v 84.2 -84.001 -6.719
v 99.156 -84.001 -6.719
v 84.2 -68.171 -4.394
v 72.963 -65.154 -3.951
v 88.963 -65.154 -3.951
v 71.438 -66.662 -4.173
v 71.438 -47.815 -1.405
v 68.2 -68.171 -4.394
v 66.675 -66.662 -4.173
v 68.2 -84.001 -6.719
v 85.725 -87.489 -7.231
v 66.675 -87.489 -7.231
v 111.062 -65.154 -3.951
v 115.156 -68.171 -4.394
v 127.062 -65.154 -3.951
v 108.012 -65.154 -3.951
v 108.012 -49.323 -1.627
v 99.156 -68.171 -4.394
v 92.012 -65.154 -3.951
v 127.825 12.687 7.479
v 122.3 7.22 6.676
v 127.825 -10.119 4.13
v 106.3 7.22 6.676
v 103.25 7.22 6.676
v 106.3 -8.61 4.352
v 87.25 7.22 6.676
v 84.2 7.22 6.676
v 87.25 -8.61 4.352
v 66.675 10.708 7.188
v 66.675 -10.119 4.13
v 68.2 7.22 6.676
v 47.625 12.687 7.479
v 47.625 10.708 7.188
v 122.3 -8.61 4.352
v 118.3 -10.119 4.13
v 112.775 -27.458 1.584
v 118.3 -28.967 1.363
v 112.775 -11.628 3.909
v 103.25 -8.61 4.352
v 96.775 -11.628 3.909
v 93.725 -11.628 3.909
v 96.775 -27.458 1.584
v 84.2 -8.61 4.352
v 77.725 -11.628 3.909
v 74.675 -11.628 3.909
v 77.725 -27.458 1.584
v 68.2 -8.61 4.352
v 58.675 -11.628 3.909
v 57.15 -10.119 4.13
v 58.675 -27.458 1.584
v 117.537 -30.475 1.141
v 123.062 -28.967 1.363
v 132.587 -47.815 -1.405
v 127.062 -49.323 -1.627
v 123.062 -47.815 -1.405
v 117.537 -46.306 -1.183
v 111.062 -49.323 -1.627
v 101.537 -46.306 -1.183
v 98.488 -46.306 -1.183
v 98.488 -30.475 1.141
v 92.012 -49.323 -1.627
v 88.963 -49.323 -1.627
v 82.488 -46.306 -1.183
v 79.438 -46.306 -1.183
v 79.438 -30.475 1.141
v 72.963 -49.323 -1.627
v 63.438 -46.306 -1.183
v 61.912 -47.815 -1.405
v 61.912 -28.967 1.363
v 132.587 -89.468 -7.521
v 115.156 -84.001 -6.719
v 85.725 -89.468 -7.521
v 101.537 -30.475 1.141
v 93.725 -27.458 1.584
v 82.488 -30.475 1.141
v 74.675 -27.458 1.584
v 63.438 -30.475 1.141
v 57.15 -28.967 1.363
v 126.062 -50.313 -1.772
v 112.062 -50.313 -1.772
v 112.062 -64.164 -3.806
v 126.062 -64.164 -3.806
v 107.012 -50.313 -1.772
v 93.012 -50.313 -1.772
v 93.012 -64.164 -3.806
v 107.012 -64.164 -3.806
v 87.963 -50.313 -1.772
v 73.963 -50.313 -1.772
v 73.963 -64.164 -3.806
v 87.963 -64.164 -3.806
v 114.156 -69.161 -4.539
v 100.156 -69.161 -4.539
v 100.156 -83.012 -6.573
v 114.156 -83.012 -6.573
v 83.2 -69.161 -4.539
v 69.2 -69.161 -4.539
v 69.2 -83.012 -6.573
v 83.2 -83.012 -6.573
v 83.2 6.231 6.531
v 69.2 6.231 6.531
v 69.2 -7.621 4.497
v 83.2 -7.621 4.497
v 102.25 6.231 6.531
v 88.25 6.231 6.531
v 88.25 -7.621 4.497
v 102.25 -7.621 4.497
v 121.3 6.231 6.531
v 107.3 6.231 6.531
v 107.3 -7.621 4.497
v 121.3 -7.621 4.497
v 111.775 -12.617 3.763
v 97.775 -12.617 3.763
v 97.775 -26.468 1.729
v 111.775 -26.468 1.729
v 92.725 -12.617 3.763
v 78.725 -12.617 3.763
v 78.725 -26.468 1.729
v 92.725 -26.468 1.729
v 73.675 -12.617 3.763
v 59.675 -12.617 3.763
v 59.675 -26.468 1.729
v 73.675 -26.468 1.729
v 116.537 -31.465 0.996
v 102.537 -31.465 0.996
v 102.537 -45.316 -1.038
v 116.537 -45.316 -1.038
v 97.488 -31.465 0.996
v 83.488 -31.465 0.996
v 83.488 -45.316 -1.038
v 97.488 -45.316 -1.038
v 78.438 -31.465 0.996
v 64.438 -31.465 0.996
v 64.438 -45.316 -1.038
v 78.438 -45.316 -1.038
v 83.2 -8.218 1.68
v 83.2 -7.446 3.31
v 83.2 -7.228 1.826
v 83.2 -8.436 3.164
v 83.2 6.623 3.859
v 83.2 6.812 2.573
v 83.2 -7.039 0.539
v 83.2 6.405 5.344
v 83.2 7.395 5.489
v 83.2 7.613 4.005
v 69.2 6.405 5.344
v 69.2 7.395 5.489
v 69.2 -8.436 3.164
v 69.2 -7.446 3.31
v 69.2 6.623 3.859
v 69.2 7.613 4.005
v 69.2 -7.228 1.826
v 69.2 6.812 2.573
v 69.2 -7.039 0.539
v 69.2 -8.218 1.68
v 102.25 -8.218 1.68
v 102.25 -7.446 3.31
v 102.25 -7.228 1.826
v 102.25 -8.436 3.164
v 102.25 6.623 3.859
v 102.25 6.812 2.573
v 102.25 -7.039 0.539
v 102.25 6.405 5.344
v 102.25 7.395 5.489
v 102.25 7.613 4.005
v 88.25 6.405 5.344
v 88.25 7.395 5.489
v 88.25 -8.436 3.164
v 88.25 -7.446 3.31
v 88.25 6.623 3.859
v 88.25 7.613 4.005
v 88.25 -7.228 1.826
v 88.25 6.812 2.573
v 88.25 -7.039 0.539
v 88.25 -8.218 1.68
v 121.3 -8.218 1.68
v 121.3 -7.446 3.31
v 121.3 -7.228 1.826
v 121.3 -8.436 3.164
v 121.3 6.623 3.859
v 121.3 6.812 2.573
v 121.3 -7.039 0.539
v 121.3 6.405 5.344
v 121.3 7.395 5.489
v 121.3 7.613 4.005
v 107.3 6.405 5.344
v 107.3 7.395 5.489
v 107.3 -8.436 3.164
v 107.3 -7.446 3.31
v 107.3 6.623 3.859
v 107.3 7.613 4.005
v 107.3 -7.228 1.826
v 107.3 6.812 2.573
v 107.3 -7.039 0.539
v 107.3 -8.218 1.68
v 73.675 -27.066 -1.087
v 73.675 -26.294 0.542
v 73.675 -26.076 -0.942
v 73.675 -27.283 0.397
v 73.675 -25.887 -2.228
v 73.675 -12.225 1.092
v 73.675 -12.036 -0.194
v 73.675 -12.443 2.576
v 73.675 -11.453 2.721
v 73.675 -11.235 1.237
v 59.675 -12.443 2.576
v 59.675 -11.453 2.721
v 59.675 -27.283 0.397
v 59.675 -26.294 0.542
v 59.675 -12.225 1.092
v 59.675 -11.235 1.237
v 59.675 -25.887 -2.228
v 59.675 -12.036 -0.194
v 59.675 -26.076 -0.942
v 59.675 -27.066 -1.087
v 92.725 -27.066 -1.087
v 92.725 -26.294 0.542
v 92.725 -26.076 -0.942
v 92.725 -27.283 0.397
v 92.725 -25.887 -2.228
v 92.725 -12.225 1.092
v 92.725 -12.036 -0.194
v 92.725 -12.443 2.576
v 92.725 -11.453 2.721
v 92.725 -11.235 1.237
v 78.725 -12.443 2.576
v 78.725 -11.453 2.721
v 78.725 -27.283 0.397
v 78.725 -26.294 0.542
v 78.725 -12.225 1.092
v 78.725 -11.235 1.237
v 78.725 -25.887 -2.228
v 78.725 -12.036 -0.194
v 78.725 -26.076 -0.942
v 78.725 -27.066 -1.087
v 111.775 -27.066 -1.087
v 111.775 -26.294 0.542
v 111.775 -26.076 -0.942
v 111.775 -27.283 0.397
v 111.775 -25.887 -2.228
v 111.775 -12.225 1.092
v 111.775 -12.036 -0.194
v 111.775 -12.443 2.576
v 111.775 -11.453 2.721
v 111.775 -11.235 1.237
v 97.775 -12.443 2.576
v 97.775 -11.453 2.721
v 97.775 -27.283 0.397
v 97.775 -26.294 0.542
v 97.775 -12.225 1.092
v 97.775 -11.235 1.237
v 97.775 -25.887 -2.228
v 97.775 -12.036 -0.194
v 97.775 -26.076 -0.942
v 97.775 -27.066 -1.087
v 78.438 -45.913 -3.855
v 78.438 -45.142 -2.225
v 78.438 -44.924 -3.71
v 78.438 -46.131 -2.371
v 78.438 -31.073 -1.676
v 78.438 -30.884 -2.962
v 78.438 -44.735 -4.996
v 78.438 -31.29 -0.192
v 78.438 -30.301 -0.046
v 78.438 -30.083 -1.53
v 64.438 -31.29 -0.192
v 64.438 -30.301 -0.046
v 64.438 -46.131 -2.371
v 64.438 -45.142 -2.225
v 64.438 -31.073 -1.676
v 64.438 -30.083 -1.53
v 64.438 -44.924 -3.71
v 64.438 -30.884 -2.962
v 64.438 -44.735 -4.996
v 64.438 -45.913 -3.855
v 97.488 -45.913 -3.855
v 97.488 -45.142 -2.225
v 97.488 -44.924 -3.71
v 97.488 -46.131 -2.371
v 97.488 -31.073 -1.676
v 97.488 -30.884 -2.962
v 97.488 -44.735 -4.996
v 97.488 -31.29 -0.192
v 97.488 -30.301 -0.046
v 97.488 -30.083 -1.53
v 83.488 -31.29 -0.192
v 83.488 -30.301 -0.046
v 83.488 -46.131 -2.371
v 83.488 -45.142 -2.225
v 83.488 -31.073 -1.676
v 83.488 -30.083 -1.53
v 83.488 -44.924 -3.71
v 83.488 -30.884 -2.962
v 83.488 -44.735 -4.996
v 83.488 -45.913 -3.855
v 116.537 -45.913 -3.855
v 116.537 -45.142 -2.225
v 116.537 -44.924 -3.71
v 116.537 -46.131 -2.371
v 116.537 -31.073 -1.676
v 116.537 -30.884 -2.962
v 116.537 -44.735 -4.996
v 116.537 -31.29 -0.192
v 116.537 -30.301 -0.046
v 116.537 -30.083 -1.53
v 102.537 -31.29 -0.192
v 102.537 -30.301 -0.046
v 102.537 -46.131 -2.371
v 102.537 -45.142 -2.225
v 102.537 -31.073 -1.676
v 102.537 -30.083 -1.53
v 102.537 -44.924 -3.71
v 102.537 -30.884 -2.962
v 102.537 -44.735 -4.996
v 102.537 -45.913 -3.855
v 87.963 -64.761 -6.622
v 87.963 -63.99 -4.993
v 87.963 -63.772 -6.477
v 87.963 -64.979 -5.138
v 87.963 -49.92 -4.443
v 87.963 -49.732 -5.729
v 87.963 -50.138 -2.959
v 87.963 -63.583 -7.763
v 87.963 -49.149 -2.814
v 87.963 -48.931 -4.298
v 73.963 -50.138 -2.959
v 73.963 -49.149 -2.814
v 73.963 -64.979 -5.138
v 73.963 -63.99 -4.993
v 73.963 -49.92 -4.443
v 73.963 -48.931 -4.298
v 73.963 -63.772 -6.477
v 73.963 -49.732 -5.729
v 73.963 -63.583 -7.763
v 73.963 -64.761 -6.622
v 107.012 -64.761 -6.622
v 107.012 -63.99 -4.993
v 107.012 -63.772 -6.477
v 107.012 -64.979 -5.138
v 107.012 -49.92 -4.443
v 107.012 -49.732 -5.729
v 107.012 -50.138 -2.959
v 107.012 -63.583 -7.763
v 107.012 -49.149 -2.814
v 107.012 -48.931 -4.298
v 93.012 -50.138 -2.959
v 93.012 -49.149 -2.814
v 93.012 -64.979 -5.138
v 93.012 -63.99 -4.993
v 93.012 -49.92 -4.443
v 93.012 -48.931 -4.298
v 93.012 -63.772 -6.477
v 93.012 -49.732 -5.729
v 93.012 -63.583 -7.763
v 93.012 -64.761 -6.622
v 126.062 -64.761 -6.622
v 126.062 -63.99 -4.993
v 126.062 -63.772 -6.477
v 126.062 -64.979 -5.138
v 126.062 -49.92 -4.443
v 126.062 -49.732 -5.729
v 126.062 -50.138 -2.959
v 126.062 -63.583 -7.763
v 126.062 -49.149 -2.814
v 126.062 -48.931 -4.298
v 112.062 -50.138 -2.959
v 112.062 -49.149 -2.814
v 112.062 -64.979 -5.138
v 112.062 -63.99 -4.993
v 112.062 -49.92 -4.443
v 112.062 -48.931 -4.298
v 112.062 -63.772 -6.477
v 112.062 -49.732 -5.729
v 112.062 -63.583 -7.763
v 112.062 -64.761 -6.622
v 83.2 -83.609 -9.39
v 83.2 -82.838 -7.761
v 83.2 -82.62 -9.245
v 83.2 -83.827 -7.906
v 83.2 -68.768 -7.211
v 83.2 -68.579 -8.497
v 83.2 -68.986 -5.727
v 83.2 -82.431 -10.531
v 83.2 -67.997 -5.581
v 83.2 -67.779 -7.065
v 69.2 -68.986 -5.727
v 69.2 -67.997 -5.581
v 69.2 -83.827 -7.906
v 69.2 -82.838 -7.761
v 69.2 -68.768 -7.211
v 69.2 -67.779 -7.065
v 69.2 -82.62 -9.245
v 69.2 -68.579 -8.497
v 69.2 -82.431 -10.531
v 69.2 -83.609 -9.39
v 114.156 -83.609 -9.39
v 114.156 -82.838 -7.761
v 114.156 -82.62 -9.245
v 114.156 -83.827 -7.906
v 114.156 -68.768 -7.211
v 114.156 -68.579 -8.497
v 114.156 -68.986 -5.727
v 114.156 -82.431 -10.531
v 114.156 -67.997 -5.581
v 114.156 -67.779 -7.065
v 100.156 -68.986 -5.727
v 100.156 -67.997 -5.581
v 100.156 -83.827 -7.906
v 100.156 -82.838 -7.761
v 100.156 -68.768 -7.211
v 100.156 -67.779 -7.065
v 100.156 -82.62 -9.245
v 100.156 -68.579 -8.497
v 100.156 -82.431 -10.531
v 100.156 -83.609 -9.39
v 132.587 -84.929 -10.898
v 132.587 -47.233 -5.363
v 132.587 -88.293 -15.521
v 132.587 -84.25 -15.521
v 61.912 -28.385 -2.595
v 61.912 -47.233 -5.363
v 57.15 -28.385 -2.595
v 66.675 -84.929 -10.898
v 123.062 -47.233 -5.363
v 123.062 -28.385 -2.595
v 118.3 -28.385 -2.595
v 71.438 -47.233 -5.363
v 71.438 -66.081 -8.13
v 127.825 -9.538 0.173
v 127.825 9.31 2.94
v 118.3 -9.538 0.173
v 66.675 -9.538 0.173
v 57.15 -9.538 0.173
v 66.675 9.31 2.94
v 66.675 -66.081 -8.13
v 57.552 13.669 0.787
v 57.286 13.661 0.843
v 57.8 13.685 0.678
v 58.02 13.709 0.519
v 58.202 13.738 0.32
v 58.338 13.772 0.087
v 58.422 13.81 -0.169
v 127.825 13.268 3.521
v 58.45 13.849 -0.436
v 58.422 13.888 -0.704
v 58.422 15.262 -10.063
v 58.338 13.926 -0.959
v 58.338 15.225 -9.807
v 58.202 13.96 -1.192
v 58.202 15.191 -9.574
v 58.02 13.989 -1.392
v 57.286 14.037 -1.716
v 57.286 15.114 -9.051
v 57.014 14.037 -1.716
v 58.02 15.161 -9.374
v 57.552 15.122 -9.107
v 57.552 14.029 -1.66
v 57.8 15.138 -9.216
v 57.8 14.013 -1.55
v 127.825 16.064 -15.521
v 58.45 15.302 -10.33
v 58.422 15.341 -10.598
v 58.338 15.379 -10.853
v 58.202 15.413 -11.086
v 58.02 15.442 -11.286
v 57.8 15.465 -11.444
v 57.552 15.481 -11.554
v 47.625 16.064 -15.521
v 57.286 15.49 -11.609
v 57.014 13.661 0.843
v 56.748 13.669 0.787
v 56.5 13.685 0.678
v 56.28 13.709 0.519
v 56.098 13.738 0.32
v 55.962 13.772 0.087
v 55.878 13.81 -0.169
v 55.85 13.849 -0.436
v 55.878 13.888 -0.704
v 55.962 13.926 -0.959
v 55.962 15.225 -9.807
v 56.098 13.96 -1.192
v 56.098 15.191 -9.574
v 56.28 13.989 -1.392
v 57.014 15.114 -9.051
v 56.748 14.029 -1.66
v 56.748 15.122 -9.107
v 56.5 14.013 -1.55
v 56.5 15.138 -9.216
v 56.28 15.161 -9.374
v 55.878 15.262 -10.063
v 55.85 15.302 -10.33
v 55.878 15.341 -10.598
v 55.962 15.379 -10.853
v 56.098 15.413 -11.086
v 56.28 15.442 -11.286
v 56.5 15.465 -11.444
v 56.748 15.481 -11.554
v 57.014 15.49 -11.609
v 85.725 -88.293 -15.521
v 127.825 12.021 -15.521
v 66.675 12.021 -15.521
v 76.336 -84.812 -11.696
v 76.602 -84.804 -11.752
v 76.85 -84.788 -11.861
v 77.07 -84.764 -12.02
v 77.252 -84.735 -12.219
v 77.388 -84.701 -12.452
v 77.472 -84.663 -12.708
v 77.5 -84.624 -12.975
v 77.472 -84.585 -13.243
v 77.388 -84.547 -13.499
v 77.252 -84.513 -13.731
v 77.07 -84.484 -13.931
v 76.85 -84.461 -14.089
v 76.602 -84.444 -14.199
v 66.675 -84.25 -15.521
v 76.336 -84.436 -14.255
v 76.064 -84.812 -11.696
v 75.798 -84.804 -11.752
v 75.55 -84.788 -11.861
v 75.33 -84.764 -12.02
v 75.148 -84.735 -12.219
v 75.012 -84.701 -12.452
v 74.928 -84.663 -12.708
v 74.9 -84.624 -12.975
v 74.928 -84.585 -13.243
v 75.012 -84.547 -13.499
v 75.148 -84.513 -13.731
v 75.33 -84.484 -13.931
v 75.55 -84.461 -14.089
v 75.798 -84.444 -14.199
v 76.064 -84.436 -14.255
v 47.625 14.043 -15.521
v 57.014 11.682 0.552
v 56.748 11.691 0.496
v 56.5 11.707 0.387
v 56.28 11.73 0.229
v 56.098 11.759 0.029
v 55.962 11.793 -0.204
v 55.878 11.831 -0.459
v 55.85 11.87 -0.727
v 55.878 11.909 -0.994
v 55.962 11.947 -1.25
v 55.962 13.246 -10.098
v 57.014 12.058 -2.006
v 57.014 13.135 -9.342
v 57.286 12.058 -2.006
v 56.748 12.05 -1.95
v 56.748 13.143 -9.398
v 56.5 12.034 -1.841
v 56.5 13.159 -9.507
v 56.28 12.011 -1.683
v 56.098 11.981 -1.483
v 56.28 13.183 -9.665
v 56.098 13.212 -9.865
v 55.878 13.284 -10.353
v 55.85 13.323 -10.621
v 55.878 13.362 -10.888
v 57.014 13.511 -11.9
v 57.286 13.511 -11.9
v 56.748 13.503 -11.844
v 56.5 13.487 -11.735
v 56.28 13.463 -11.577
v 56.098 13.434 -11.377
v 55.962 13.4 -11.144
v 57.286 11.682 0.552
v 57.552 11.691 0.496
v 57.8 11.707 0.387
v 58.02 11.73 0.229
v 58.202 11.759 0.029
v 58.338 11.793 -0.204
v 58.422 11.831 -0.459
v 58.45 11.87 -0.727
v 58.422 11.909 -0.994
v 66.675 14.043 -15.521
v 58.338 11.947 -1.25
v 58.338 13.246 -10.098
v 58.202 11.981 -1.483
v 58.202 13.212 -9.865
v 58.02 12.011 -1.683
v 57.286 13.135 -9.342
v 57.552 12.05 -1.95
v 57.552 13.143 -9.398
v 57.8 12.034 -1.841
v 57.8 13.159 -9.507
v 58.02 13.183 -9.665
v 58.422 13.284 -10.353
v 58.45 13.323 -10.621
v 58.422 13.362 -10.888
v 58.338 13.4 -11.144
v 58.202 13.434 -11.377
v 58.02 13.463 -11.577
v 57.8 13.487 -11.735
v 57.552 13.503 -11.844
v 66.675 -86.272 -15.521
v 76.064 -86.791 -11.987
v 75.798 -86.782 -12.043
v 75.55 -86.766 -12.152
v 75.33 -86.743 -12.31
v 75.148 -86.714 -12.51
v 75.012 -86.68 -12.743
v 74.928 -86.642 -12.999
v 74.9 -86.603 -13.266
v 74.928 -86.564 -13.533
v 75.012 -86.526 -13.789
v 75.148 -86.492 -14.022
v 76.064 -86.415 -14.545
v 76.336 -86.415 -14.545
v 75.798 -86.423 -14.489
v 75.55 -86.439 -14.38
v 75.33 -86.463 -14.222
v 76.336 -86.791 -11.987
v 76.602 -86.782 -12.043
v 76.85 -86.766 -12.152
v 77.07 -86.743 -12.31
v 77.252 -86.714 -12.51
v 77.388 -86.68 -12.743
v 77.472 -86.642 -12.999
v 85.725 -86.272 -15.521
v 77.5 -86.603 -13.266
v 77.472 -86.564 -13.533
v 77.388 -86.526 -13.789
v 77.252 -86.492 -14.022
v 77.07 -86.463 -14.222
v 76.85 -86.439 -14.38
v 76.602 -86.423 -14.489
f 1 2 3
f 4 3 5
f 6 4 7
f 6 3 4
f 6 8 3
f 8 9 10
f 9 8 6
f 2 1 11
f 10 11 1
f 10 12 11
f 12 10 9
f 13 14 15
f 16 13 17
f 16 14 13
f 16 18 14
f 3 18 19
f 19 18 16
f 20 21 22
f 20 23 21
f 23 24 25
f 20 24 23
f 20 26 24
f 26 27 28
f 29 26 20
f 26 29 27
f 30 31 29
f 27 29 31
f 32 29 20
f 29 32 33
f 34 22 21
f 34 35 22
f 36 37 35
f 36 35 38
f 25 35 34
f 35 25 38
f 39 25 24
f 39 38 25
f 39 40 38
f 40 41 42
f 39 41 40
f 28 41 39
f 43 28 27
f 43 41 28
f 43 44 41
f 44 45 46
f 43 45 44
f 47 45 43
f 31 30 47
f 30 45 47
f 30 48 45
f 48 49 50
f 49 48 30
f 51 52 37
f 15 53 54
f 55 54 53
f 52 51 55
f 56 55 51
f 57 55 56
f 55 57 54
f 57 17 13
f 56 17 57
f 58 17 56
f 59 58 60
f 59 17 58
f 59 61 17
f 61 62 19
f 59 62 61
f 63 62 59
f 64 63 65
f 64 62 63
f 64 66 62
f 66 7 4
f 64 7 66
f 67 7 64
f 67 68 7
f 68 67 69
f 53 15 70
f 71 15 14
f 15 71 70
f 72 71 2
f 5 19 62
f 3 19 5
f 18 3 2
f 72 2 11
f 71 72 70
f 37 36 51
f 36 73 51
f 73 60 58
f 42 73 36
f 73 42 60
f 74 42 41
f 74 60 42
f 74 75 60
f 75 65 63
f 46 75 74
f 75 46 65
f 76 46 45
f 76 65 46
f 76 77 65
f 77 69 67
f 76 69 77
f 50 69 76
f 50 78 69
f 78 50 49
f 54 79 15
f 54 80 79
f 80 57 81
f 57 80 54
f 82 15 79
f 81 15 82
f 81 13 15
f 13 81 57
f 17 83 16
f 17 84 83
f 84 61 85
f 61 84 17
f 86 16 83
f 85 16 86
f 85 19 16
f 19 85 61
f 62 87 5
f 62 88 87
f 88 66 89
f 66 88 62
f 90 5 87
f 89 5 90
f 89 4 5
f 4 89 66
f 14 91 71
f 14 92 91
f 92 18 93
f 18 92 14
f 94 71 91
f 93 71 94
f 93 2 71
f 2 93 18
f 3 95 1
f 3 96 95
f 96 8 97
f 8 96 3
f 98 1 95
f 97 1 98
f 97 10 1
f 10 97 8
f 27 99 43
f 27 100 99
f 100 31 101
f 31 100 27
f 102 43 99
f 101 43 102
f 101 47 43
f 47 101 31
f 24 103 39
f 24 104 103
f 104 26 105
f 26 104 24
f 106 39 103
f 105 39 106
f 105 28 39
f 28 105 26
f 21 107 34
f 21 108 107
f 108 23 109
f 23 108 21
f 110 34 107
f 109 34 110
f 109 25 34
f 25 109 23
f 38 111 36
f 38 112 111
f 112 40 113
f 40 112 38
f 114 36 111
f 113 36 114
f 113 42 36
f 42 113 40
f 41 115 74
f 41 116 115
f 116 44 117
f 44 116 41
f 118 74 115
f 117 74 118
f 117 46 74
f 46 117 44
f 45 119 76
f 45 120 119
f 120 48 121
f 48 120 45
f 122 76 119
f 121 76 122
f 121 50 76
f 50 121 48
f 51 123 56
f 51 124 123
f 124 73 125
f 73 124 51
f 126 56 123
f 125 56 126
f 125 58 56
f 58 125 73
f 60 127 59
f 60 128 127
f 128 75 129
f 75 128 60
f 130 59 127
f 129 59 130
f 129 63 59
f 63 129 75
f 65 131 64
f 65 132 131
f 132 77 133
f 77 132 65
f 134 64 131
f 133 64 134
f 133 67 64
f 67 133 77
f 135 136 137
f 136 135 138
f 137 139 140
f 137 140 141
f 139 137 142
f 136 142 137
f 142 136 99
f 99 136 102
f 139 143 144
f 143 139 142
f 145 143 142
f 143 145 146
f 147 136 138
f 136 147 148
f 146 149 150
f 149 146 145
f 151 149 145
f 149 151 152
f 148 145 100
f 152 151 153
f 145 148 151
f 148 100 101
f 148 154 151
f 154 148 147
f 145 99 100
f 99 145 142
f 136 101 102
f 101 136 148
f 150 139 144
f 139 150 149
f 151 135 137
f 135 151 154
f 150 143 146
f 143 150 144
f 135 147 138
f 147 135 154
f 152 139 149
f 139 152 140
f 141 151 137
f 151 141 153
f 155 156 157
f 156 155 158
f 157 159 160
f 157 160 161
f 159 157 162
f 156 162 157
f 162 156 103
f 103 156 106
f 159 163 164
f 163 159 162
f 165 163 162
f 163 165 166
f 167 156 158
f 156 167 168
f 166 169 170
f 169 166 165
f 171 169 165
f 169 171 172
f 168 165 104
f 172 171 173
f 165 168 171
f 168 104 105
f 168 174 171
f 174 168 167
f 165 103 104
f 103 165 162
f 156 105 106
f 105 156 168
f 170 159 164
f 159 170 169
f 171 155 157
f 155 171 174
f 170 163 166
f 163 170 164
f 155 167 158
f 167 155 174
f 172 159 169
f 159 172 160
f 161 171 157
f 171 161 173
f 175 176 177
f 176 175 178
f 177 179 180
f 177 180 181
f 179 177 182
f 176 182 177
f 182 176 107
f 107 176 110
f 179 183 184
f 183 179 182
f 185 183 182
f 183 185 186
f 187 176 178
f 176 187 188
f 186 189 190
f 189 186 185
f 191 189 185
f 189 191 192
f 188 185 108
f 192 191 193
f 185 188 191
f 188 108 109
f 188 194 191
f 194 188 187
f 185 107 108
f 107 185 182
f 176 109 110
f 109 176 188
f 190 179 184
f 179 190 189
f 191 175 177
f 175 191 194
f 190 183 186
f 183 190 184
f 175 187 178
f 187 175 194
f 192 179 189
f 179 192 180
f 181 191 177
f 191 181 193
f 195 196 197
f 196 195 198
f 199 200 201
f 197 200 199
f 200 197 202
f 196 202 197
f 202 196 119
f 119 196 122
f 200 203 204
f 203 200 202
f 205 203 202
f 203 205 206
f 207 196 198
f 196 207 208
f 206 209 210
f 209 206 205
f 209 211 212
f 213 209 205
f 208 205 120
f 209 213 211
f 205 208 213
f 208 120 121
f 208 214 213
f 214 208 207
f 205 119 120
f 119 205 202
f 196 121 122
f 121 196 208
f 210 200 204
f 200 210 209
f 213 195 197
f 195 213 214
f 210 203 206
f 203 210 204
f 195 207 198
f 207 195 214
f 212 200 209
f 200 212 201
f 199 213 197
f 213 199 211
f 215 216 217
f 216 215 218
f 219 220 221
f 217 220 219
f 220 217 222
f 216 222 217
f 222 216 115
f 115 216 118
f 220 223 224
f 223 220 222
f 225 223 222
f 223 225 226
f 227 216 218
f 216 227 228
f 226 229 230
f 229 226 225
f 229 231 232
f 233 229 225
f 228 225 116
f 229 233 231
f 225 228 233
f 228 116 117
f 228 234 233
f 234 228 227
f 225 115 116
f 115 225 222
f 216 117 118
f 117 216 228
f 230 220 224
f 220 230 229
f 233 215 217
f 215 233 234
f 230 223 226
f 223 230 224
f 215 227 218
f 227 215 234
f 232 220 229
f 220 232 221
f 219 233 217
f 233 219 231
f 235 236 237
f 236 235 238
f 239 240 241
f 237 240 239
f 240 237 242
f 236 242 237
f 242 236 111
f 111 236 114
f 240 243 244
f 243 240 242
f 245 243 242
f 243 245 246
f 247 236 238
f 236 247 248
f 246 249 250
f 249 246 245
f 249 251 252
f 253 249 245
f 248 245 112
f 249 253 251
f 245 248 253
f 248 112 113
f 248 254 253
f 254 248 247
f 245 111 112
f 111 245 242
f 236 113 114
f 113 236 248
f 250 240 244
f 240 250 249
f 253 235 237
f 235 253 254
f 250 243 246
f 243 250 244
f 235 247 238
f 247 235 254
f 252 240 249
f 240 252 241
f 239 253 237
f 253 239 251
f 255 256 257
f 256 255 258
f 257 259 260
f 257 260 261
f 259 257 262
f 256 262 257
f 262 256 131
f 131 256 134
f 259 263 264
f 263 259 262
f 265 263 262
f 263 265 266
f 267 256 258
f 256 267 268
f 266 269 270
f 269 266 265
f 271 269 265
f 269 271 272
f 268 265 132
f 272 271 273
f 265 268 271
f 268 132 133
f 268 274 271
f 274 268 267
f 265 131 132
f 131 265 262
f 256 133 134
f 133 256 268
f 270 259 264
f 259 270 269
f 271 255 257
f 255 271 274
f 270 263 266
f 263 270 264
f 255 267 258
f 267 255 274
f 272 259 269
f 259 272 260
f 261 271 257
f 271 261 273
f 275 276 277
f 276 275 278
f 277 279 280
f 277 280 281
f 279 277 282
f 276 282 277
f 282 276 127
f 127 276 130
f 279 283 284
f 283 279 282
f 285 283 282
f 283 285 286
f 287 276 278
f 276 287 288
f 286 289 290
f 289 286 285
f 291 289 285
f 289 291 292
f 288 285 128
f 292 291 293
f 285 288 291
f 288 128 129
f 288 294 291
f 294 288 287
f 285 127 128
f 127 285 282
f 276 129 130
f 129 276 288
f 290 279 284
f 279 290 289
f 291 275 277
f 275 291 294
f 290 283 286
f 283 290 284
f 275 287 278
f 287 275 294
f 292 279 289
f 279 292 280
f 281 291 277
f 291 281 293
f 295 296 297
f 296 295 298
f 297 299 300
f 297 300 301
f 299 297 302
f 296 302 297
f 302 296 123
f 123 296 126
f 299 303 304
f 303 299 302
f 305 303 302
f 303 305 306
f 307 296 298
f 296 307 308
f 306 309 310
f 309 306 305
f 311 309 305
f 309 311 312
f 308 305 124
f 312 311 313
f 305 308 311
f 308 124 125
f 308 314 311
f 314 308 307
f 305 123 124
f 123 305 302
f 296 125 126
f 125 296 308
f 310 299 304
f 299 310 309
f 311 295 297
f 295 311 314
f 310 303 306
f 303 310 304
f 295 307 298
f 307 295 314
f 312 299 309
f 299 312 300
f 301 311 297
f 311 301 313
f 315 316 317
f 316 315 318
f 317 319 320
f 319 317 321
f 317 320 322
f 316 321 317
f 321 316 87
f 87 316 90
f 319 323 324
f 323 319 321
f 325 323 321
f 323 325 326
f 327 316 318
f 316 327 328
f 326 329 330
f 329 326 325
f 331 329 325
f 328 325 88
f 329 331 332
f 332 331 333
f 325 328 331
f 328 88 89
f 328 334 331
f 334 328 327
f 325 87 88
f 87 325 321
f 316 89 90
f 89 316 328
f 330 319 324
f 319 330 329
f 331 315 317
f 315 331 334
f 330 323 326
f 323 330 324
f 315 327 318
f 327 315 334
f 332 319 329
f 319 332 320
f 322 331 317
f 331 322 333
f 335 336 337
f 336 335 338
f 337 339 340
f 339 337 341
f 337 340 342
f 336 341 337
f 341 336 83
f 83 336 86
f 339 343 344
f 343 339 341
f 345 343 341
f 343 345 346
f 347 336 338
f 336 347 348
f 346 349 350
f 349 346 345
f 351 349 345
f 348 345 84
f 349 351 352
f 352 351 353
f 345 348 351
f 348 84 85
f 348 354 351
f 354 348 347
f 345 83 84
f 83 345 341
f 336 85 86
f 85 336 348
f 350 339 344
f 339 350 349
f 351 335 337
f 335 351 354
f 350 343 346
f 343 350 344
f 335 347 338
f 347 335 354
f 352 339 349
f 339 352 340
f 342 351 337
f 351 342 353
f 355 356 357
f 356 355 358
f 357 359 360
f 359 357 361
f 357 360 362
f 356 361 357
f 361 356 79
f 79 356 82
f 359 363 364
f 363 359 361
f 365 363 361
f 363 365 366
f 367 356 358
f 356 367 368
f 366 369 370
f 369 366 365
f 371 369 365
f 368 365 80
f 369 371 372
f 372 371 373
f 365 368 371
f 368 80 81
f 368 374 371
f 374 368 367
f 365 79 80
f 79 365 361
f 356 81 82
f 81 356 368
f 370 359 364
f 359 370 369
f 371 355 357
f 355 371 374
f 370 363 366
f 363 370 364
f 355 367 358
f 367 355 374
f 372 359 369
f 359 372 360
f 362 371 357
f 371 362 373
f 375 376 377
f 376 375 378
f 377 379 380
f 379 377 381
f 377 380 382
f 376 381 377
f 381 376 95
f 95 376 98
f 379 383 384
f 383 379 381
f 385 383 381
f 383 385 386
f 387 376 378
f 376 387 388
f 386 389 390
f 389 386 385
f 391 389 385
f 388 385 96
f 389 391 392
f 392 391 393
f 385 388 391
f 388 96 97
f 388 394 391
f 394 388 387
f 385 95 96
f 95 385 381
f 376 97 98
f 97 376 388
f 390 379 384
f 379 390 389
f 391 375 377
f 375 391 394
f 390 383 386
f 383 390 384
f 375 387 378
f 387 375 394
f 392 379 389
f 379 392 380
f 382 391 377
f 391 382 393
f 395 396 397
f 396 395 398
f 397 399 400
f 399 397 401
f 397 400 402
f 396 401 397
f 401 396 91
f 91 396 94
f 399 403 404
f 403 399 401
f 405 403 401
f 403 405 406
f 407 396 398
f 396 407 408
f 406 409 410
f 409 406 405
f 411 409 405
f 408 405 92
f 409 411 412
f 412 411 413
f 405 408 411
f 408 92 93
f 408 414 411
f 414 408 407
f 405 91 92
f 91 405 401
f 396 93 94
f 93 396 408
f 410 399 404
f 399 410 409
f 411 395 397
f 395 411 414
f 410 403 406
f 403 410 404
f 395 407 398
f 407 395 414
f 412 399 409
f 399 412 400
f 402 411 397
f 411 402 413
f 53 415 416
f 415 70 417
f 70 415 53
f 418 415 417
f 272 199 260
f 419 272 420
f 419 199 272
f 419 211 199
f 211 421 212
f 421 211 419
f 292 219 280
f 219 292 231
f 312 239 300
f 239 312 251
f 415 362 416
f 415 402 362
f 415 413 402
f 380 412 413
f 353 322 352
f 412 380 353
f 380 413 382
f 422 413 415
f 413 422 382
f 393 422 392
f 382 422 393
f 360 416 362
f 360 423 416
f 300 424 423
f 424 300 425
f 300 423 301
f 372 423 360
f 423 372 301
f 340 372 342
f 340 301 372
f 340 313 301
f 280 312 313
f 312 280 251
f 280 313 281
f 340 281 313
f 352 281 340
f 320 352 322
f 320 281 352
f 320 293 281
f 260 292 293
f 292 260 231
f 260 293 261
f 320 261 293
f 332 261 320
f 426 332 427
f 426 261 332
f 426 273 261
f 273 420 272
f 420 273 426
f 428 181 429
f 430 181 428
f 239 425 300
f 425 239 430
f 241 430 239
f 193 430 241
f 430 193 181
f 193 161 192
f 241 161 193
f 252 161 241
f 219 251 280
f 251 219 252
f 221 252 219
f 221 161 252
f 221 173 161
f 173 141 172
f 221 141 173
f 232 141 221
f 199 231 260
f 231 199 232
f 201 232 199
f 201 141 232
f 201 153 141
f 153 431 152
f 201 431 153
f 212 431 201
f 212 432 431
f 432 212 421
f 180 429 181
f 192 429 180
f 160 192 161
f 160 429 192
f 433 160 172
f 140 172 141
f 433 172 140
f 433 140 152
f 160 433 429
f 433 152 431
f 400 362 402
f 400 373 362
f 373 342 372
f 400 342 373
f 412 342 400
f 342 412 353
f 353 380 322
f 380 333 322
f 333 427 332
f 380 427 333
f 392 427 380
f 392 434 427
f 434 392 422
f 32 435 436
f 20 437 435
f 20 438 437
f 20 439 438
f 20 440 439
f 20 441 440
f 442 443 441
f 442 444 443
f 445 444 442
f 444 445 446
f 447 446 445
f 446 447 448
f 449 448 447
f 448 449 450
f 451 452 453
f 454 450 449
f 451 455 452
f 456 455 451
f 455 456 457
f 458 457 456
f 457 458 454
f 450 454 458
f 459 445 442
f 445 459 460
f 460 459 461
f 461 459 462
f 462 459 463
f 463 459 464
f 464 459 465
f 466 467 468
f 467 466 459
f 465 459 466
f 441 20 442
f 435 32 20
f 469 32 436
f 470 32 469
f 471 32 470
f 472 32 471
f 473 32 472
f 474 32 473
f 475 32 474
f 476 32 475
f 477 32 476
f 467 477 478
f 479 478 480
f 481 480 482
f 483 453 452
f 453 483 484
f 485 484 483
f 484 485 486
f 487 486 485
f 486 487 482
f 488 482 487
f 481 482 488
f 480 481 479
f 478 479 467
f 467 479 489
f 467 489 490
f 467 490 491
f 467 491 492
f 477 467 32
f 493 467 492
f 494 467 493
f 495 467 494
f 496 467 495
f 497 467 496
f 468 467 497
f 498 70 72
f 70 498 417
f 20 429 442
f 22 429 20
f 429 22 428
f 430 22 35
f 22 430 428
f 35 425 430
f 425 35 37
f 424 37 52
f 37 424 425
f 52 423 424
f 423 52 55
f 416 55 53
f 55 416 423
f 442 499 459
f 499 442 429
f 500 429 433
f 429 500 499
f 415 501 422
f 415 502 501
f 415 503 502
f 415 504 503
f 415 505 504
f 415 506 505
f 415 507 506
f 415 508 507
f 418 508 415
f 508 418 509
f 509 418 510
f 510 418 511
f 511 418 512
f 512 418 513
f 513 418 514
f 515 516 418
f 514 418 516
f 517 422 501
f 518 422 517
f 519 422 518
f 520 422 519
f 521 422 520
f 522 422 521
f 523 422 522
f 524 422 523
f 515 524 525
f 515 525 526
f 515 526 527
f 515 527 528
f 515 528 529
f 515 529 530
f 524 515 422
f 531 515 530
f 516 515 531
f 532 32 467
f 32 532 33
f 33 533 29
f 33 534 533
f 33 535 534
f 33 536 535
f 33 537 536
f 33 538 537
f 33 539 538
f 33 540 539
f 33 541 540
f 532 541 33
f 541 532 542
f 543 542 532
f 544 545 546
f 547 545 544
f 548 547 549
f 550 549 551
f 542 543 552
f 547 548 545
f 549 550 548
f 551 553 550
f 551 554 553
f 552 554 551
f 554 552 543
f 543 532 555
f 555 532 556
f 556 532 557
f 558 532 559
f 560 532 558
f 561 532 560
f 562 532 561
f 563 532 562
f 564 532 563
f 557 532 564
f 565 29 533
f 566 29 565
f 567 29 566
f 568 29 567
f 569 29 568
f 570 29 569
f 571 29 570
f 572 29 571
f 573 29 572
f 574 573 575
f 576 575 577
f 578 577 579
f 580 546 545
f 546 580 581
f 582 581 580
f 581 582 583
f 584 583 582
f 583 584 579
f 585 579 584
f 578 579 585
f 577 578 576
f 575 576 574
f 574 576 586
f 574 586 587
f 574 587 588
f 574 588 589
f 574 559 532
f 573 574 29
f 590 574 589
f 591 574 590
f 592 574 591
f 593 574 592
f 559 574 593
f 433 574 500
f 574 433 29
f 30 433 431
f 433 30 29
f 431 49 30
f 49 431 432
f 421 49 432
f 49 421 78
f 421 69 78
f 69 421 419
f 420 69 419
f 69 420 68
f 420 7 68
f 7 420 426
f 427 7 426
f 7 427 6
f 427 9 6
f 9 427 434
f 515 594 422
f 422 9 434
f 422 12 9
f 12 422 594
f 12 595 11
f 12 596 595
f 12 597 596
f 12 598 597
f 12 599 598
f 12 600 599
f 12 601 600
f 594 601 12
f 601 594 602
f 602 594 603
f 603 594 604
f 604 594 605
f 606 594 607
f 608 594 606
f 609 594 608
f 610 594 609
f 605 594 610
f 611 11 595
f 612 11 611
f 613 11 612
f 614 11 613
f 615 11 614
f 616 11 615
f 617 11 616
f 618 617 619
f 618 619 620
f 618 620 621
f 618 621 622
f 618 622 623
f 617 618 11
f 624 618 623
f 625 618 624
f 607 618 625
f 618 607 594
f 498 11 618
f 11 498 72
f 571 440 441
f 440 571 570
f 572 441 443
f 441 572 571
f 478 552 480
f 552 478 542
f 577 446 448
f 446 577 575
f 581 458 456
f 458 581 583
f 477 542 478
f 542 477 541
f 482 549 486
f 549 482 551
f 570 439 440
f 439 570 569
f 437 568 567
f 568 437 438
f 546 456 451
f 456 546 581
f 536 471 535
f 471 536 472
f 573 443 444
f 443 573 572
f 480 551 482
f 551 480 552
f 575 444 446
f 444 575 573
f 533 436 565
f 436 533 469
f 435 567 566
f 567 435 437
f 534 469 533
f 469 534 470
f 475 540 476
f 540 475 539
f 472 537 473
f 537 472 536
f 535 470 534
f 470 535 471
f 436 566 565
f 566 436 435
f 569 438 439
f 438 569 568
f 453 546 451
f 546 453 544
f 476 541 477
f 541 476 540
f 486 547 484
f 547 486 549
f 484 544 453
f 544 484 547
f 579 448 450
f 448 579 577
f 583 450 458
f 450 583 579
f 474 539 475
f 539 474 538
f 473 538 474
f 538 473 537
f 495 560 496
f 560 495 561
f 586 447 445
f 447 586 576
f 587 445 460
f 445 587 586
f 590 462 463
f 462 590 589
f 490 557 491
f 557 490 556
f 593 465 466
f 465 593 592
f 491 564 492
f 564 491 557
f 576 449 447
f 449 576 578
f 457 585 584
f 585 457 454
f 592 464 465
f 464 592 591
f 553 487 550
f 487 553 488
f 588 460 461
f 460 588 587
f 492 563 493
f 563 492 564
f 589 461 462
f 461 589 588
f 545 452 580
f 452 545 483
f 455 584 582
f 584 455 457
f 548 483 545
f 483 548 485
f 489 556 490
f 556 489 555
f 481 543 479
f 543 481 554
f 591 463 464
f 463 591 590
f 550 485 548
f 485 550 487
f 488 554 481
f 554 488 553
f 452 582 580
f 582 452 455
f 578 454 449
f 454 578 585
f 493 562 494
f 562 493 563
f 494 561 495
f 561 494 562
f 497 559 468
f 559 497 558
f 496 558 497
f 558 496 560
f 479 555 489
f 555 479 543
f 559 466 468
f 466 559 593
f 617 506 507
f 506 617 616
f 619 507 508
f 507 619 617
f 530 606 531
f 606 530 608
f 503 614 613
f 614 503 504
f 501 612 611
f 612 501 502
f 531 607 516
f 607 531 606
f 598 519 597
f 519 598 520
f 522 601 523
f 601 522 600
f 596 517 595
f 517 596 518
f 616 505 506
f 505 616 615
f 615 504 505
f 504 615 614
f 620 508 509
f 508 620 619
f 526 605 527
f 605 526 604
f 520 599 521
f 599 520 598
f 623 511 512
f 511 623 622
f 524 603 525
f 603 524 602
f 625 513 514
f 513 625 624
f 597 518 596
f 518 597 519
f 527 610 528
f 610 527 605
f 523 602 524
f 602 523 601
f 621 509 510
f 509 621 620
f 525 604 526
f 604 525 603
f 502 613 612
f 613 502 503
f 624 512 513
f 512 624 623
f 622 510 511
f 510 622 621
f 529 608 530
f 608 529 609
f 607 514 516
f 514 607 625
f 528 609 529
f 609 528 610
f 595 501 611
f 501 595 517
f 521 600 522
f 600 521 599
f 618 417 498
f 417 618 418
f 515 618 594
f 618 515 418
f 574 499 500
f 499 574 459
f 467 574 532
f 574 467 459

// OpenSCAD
// file: pro_micro_house_case.scad
pro_micro_house_w_x = 22;
pro_micro_house_w_y = 54;
pro_micro_house_gpio_area_w_y = 34;

padding_x = 1.5;
padding_y_t = 0.5;
padding_z_t = 1.5;
padding_z_b = 1.5;

pro_micro_house_h = 1.5;
spacer_h = 7;

spacer_l_x = 3.5;
spacer_r_x = 18.5;
spacer_b_y = 36;
spacer_t_y = 52.5;
spacer_r = 1.3;

spacer_scale_inverse = 10;

trrs_y = 42.5;
trrs_w_y = 6.5;
trrs_h = 6.5;

reset_switch_x = 7.5;
reset_switch_y = 34;
reset_switch_w_x = 7;
reset_switch_w_y = 7.5;

pro_micro_house_case();

module pro_micro_house_case() {
    difference() {
        cube([pro_micro_house_w_x + 2 * padding_x, pro_micro_house_w_y + padding_y_t, pro_micro_house_h + spacer_h + padding_z_b + padding_z_t], center = false);
        translate([padding_x, 0, 0]) {
            cube([pro_micro_house_w_x, pro_micro_house_gpio_area_w_y, padding_z_b], center = false);
        }
        translate([padding_x, 0, padding_z_b]) {
            cube([pro_micro_house_w_x, pro_micro_house_w_y + padding_y_t, pro_micro_house_h + spacer_h + padding_z_t], center = false);
        }
        translate([spacer_l_x + padding_x, spacer_b_y, padding_z_b / 2]) {
            scale(1 / spacer_scale_inverse) {
                cylinder(r = spacer_scale_inverse * spacer_r, h = spacer_scale_inverse * padding_z_b, center = true);
            }
        }
        translate([spacer_l_x + padding_x, spacer_t_y, padding_z_b / 2]) {
            scale(1 / spacer_scale_inverse) {
                cylinder(r = spacer_scale_inverse * spacer_r, h = spacer_scale_inverse * padding_z_b, center = true);
            }
        }
        translate([spacer_r_x + padding_x, spacer_b_y, padding_z_b / 2]) {
            scale(1 / spacer_scale_inverse) {
                cylinder(r = spacer_scale_inverse * spacer_r, h = spacer_scale_inverse * padding_z_b, center = true);
            }
        }
        translate([spacer_r_x + padding_x, spacer_t_y, padding_z_b / 2]) {
            scale(1 / spacer_scale_inverse) {
                cylinder(r = spacer_scale_inverse * spacer_r, h = spacer_scale_inverse * padding_z_b, center = true);
            }
        }
        translate([padding_x + reset_switch_x, reset_switch_y, 0]) {
            cube([reset_switch_w_x, reset_switch_w_y, padding_z_b], center = false);
        }
        translate([0, trrs_y, padding_z_b]) {
            cube([padding_x, trrs_w_y, pro_micro_house_h + spacer_h + padding_z_t], center = false);
        }
        translate([pro_micro_house_w_x + padding_x, trrs_y, padding_z_b]) {
            cube([padding_x, trrs_w_y, pro_micro_house_h + spacer_h + padding_z_t], center = false);
        }
    }
}

module pro_micro_cube(y, w_y) {
    translate([padding_x, y - w_y, padding_z_b]) {
        cube([pro_micro_house_w_x, w_y, pro_micro_house_h + spacer_h + padding_z_t], center = false);
    }
}

module trrs_cube_l(w_x) {
    translate([-w_x + padding_x, trrs_y, padding_z_b]) {
        cube([w_x, trrs_w_y, pro_micro_house_h + spacer_h + padding_z_t], center = false);
    }
}

module trrs_cube_r(w_x) {
    translate([pro_micro_house_w_x + padding_x, trrs_y, padding_z_b]) {
        cube([w_x, trrs_w_y, pro_micro_house_h + spacer_h + padding_z_t], center = false);
    }
}

module pro_micro_house_left_padding_cube(w_x) {
    translate([-w_x, 0, 0]) {
        cube([w_x, pro_micro_house_w_y + padding_y_t, pro_micro_house_h + spacer_h + padding_z_b + padding_z_t], center = false);
    }
}

module pro_micro_house_right_padding_cube(w_x) {
    translate([pro_micro_house_w_x + 2 * padding_x, 0, 0]) {
        cube([w_x, pro_micro_house_w_y + padding_y_t, pro_micro_house_h + spacer_h + padding_z_b + padding_z_t], center = false);
    }
}
// file: key_switch.scad
key_switch(0, 0);

module key_switch(x, y) {
    union() {
        h1 = 2;
        translate([x, y, h1 / 2]) {
            cube([16, 16, h1], center=true);
        }
        h2 = 5;
        translate([x, y, h1 + h2 / 2]) {
            cube([16, 16, h2], center=true);
        }
        h3 = 1.2;
        translate([x, y, -h3 / 2]) {
            cube([14, 14, h3], center=true);
        }
        h4 = 1.5;
        translate([x, y, -h3 - h4 / 2]) {
            cube([14, 16, h4], center=true);
        }
        h5 = 10;
        translate([x, y, -h3 - h4 - h5 / 2]) {
            cube([14, 14, h5], center=true);
        }
        key_cap(x, y);
    }
}

module key_cap(x, y) {
    wx1 = 18;
    dx1 = wx1 / 2;

    wy1 = 18;
    dy1 = wy1 / 2;

    wx2 = 12;
    dx2 = wx2 / 2;

    wy2 = 13;
    ry2 = 0.6; // should be greater than 0.5

    z1 = 7;

    z2 = z1 + 10;

    points = [
    [x + dx1, y + dy1, z1], // 0
    [x + dx1, y - dy1, z1], // 1
    [x - dx1, y + dy1, z1], // 2
    [x - dx1, y - dy1, z1], // 3
    [x + dx2, y + ry2 * wy2, z2], // 4
    [x + dx2, y - (1 - ry2) * wy2, z2], // 5
    [x - dx2, y + ry2 * wy2, z2], // 6
    [x - dx2, y - (1 - ry2) * wy2, z2] // 7
    ];
    
    // "All faces must have points ordered in the same direction . OpenSCAD prefers clockwise when looking at each face from outside inwards (from OpenSCAD User Manual/Primitive Solids)"
    faces = [
        [0, 2, 3, 1], // bottom
        [0, 1, 5, 4], // right
        [1, 3, 7, 5], // front
        [3, 2, 6, 7], // left
        [2, 0, 4, 6], // back
        [4, 5, 7, 6]  // top
    ];
    
    polyhedron(points, faces);
}
// main file
use <key_switch.scad>
use <pro_micro_house_case.scad>

w_unit = 19.05; // unit width

y1 = 0;           // row1
y2 = -w_unit;     // row2
y3 = -2 * w_unit; // row3
y4 = -3 * w_unit; // row4
y5 = -4 * w_unit; // row5

plate_padding_x_l = 4; // plate padding x left 
plate_padding_x_r = 4; // plate padding x right
plate_padding_y_t = 4; // plate padding y top
plate_padding_y_b = 4; // plate padding y bottom

plate_w_x = plate_padding_x_l + w_unit / 2 + 6.75 * w_unit + plate_padding_x_r;
plate_w_y = plate_padding_y_t + w_unit / 2 + 4.5 * w_unit + plate_padding_y_b;
plate_h = 4;

foot_w = 4;
foot_h = 30;

keyboard_h_low = 10;
keyboard_h_high = 25;

plate_rotation_x = asin((keyboard_h_high - keyboard_h_low) / plate_w_y);
echo("plate_rotation_x = ", plate_rotation_x);

base_cube_dz = -(plate_w_y * (keyboard_h_high + keyboard_h_low) * sin(plate_rotation_x) / (keyboard_h_high - keyboard_h_low) - plate_h * cos(plate_rotation_x)) / 2;

screw_r = 1.3;
screw_scale_inverse = 10;

pro_micro_dy = -1.8;

keyboard();

module keyboard() {
    difference() {
        /*
        union() {
            keyboard_case();
            pro_micro();
        }
        */
        keyboard_case();
        translate([-w_unit / 2 - plate_padding_x_l, w_unit / 2 + plate_padding_y_t + pro_micro_dy, base_cube_dz]) {
            rotate([0, 0, -90]) {
                trrs_cube_l(2 * plate_padding_y_t);
            }
        }
        translate([-w_unit / 2 - plate_padding_x_l, w_unit / 2 + plate_padding_y_t + pro_micro_dy, base_cube_dz]) {
            rotate([0, 0, -90]) {
                pro_micro_cube(plate_padding_x_l, 2 * plate_padding_x_l);
            }
        }
    }
}

module pro_micro() {
    translate([-w_unit / 2 - plate_padding_x_l, w_unit / 2 + plate_padding_y_t + pro_micro_dy, base_cube_dz]) {
        rotate([0, 0, -90]) {
            union() {
                pro_micro_house_left_padding_cube(1);
                pro_micro_house_case();
            }
        }
    }
}

module keyboard_case() {
    difference() {
        untranslate_plate_origin_in_yz_plane() {
            rotate([plate_rotation_x, 0, 0]) {
                translate_plate_origin_in_yz_plane() {
                    difference() {
                        union() {
                            keyboard_plate();
                            foot();
                        }
                        left_margins();
                        screws();
                    }
                }
            }
        }
        base_cube();
    }
}

module base_cube() {
    base_cube_h = 100;
    base_cube_extension_y = 10;
    translate_from_origin_to_plate_left_bottom() {
        translate([0, 0, base_cube_dz - base_cube_h]) {
            cube([plate_w_x, plate_w_y + base_cube_extension_y, base_cube_h], center = false);
        } 
    }
}

module screws() {
    dz_screw_top_1 = -8;
    dz_screw_top_2 = -18;

    dz_screw_bottom = -6.1;

    // foot top
    translate([plate_padding_x_l + 3 * w_unit + w_unit / 2 , -foot_w / 2, dz_screw_top_1]) {
        translate_from_origin_to_plate_left_top() {
            screw();
        }
    }
    translate([plate_padding_x_l + 3 * w_unit + w_unit / 2 , -foot_w / 2, dz_screw_top_2]) {
        translate_from_origin_to_plate_left_top() {
            screw();
        }
    }

    // foot bottom
    translate([plate_padding_x_l + 4 * w_unit + w_unit / 2, foot_w / 2, dz_screw_bottom]) {
        translate_from_origin_to_plate_left_bottom() {
            screw();
        }
    }
}

module screw() {
    rotate([90, 0, 0]) {
        scale(1 / screw_scale_inverse) {
            cylinder(r = screw_scale_inverse * screw_r, h = screw_scale_inverse * foot_w, center = true);
        }
    }
}

module right_margins() {
    margin = 5 * w_unit;
    
    // padding top
    padding_top_cube_with_right_margin(3 * w_unit, y1 + w_unit / 2 + 3 * plate_padding_y_t / 4, 2 * foot_h, margin);
    padding_top_cube_with_right_margin(4 * w_unit, y1 + w_unit / 2 + plate_padding_y_t / 4, 2 * foot_h, margin);

    // row 1
    unit_cube_with_right_margin(4 * w_unit, y1, margin);

    // row 2
    unit_cube_with_right_margin((1.5 + 2) * w_unit, y2, margin);

    // row 3
    unit_cube_with_right_margin((1.75 + 2) * w_unit, y3, margin);

    // row 4
    unit_cube_with_right_margin((2.25 + 2) * w_unit, y4, margin);
    
    // row 5
    unit_cube_with_right_margin(4 * w_unit, y5, margin);
    
    // padding bottom
    padding_bottom_cube_with_right_margin(4 * w_unit, y5 - w_unit / 2 - plate_padding_y_b / 4, 2 * foot_h, margin);
    padding_bottom_cube_with_right_margin(5 * w_unit, y5 - w_unit / 2 - 3 * plate_padding_y_t / 4, 2 * foot_h, margin);
}

module left_margins() {
    margin = 6 * w_unit;
    
    // padding top
    padding_top_cube_with_left_margin(2 * w_unit, y1 + w_unit / 2 + 3 *  plate_padding_y_t / 4, 2 * foot_h, margin);
    padding_top_cube_with_left_margin(3 * w_unit, y1 + w_unit / 2 + plate_padding_y_t / 4, 2 * foot_h, margin);

    // row 1
    unit_cube_with_left_margin(3 * w_unit, y1, margin);

    // row 2
    unit_cube_with_left_margin((1.5 + 1) * w_unit, y2, margin);

    // row 3
    unit_cube_with_left_margin((1.75 + 1) * w_unit, y3, margin);

    // row 4
    unit_cube_with_left_margin((2.25 + 1) * w_unit, y4, margin);
    
    // row 5
    unit_cube_with_left_margin(3 * w_unit, y5, margin);
    
    // padding bottom
    padding_bottom_cube_with_left_margin(3 * w_unit, y5 - w_unit / 2 - plate_padding_y_b / 4, 2 * foot_h, margin);
    padding_bottom_cube_with_left_margin(4 * w_unit, y5 - w_unit / 2 - 3 *  plate_padding_y_t / 4, 2 * foot_h, margin);
}

module foot() {
    union() {
        dz = -plate_h - foot_h;

         // top
        translate_from_origin_to_plate_left_top() {
            translate([0, -foot_w, dz]) {
                cube([plate_w_x - w_unit / 4, foot_w, foot_h], center = false);
            }
        }

        /*
        // left
        translate_from_origin_to_plate_left_bottom() {
            translate([0, 0, dz]) {
                cube([foot_w, plate_w_y, foot_h], center = false);
            }
        }
        */

        // bottom
        translate_from_origin_to_plate_left_bottom() {
            translate([0, 0, dz]) {
                cube([plate_w_x, foot_w, foot_h], center = false);
            }
        }
    }
}

module keyboard_plate() {
    difference() {    
        plate();
        key_switches();
        unit_cube(7 * w_unit + plate_padding_x_r, y1 + w_unit);
        unit_cube(7 * w_unit + plate_padding_x_r, y1);
        unit_cube((1.5 + 5) * w_unit + plate_padding_x_r, y2);
        unit_cube((1.75 + 5) * w_unit + plate_padding_x_r, y3);
    }
}

module plate() {
    translate([0, 0, -plate_h]) {
        translate_from_origin_to_plate_left_bottom() {
            cube([plate_w_x, plate_w_y, plate_h], center = false);
        }
    }
}

module key_switches() {
    // row 1
    for (i = [0:6]) {
        key_switch(i * w_unit, y1);
    }

    // row 2
    key_switch(0.25 * w_unit, y2);
    for (i = [0:4]) {
        key_switch((1.5 + i) * w_unit, y2);
    }

    // row 3
    key_switch(0.375 * w_unit, y3);
    for (i = [0:4]) {
        key_switch((1.75 + i) * w_unit, y3);
    }

    // row 4
    key_switch(0.625 * w_unit, y4);
    for (i = [0:4]) {
        key_switch((2.25 + i) * w_unit, y4);
    }
    
    // row 5
    key_switch(1.5 * w_unit, y5);
    key_switch(2.75 * w_unit, y5);
    key_switch(4 * w_unit, y5);
    key_switch(5.625 * w_unit, y5);
}

module unit_cube(x, y) {
    translate([x, y, 0]) {
        cube([w_unit, w_unit, w_unit], center = true);
    }
}

module unit_cube_with_right_margin(x, y, m) {
    translate([x, y, 0]) {
        translate([-w_unit / 2, -w_unit / 2, -w_unit / 2]) {
            cube([w_unit + m, w_unit, w_unit], center = false);
        }
    }
}

module padding_top_cube_with_right_margin(x, y, h, m) {
    translate([x, y, 0]) {
        translate([-w_unit / 2, -plate_padding_y_t / 4, -h / 2]) {
            cube([w_unit + m, plate_padding_y_t / 2, h], center = false);
        }
    }
}

module padding_bottom_cube_with_right_margin(x, y, h, m) {
    translate([x, y, 0]) {
        translate([-w_unit / 2, -plate_padding_y_b / 4, -h / 2]) {
            cube([w_unit + m, plate_padding_y_b / 2, h], center = false);
        }
    }
}

module unit_cube_with_left_margin(x, y, m) {
    translate([x, y, 0]) {
        translate([-w_unit / 2 - m, -w_unit / 2, -w_unit / 2]) {
            cube([w_unit + m, w_unit, w_unit], center = false);
        }
    }
}

module padding_top_cube_with_left_margin(x, y, h, m) {
    translate([x, y, 0]) {
        translate([-w_unit / 2 - m, -plate_padding_y_t / 4, -h / 2]) {
            cube([w_unit + m, plate_padding_y_t / 2, h], center = false);
        }
    }
}

module padding_bottom_cube_with_left_margin(x, y, h, m) {
    translate([x, y, 0]) {
        translate([-w_unit / 2 - m, -plate_padding_y_b / 4, -h / 2]) {
            cube([w_unit + m, plate_padding_y_b / 2, h], center = false);
        }
    }
}

// operator modules

module translate_plate_origin_in_yz_plane() {
    translate([0, plate_w_y / 2, plate_h / 2]) {
        translate([0, -w_unit / 2 - plate_padding_y_t, 0]) {
            children();
        }
    }
}

module untranslate_plate_origin_in_yz_plane() {
    translate([0, w_unit / 2 + plate_padding_y_t, 0]) {
        translate([0, -plate_w_y / 2, -plate_h / 2]) {
            children();
        }
    }
}

module translate_from_origin_to_plate_left_bottom() {
    translate_from_origin_to_plate_left_top() {
        translate([0, -plate_w_y, 0]) {
            children();
        }
    }
}

module translate_from_origin_to_plate_left_top() {
    translate([-w_unit / 2 - plate_padding_x_l, w_unit / 2 + plate_padding_y_t, 0]) {
        children();
    }
}
